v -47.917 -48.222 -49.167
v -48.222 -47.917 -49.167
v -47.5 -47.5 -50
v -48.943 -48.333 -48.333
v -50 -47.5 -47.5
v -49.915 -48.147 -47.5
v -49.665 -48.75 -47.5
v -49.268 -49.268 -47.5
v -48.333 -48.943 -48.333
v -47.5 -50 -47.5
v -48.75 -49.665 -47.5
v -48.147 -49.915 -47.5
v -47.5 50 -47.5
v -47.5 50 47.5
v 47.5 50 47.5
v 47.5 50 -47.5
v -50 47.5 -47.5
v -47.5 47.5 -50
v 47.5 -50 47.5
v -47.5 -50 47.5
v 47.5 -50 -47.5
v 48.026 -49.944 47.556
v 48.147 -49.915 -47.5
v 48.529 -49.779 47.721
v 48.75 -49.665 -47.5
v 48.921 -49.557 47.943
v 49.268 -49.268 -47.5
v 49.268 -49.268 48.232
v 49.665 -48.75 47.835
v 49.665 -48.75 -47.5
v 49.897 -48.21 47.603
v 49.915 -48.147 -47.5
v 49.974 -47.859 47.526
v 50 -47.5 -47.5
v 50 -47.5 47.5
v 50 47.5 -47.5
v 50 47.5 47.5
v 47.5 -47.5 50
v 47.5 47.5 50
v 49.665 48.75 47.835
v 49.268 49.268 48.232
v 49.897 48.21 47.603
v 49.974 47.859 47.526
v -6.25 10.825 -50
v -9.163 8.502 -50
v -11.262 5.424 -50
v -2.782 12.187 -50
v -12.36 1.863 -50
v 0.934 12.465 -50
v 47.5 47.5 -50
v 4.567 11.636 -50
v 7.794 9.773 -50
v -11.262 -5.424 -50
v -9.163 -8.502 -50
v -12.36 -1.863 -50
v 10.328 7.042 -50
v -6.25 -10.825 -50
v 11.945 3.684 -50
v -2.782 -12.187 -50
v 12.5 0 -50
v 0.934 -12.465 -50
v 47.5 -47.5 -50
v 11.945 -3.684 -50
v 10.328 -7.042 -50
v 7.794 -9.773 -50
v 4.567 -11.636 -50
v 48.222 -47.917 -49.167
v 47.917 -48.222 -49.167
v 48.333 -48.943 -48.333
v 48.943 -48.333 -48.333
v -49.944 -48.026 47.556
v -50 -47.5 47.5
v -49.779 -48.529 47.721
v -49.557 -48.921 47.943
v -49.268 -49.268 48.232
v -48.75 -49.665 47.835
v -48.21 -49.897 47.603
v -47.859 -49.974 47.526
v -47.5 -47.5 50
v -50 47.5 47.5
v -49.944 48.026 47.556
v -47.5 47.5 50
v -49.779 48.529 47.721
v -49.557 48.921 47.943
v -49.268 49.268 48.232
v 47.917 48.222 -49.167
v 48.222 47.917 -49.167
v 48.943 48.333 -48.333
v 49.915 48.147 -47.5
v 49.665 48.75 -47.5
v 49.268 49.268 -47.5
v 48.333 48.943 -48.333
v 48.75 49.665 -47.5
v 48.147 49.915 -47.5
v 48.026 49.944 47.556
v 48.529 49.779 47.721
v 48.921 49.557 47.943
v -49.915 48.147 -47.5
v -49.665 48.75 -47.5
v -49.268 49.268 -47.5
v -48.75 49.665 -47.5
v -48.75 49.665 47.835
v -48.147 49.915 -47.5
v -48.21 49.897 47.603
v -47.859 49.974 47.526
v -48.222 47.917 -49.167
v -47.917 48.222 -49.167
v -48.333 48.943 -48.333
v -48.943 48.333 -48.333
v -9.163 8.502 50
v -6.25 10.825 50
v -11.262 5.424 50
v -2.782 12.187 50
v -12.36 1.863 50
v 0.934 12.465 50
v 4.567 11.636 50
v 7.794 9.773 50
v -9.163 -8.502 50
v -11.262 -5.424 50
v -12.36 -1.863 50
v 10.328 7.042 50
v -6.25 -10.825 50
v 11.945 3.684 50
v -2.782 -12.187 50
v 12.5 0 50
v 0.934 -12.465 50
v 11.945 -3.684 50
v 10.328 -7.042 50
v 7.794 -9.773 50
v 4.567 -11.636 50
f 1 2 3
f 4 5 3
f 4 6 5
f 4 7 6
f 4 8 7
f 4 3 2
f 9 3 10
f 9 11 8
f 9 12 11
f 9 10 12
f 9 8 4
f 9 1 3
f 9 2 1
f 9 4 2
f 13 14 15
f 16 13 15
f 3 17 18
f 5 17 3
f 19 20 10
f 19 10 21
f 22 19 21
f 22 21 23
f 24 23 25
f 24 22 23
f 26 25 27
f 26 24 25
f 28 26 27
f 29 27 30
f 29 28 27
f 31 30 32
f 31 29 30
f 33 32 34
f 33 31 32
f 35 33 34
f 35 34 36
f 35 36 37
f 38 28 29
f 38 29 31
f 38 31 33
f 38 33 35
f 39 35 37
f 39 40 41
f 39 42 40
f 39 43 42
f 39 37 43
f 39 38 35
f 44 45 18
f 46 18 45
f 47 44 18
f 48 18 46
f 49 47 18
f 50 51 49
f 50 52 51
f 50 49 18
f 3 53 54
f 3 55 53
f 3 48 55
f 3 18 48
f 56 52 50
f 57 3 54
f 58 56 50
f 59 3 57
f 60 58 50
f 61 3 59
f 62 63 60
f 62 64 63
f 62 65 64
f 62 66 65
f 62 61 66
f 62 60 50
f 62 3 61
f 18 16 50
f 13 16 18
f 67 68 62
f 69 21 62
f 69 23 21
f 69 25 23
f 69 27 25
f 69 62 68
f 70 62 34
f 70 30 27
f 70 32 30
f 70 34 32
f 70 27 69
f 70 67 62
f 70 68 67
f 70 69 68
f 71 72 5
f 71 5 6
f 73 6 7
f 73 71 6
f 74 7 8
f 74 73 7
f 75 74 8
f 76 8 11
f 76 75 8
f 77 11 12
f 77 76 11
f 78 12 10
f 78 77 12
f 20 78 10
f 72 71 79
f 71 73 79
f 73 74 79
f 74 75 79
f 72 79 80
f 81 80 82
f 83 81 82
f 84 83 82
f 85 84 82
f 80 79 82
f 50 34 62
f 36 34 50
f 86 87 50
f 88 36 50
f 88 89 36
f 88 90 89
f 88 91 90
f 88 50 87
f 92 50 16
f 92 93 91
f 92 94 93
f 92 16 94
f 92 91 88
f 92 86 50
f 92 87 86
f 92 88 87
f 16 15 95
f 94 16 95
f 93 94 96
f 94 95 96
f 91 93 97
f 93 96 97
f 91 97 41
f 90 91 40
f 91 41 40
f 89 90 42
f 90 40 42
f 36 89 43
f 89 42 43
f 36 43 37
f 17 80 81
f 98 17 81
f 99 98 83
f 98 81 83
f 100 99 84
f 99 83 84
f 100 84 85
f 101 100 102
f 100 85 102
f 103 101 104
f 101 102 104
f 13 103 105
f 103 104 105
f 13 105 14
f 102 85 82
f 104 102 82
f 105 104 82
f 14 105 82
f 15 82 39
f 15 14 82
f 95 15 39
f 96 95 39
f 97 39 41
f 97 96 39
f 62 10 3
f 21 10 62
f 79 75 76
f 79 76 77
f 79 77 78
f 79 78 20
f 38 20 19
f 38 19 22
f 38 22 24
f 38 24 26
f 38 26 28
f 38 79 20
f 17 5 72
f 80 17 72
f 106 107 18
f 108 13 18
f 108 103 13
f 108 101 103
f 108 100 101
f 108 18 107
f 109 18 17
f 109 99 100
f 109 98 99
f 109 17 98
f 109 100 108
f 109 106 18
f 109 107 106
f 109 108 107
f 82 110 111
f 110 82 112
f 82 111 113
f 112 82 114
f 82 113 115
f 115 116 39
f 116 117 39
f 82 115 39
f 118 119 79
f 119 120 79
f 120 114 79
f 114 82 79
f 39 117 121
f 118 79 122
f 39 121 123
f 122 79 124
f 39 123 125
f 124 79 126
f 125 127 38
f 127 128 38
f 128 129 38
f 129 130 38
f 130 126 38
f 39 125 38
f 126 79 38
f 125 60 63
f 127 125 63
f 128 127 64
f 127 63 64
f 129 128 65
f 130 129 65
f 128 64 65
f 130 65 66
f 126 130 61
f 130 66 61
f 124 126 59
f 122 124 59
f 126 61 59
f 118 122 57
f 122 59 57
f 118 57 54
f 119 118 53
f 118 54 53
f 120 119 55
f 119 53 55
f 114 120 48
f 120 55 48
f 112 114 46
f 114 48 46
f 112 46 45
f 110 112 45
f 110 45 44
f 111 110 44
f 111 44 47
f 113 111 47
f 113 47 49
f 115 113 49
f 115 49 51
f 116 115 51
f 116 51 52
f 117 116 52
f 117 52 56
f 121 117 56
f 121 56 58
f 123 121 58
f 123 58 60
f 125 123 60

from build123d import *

# Parameters (mm, degrees)
F0_W     = 100
F0_H     = 100
F1_DEPTH = 50
F2_SIZE  = 2.5
F3_R     = 2.5
F4_SIZE  = 2.5
F5_R     = 12.5
F6_DEPTH = 100.001


with BuildPart() as f1:
    # F0 (on Front) → F1 (new body, symmetric)
    with BuildSketch(Plane.XZ):
        Rectangle(F0_W, F0_H)
    extrude(amount=F1_DEPTH, both=True)

    # F2
    f2_edges = [f1.edges().sort_by_distance(p)[0] for p in [
        (50, 0, 50),
        (0, -50, 50),
        (-50, 0, 50),
        (0, 50, 50),
    ]]
    chamfer(f2_edges, length=F2_SIZE)

    # F3
    f3_edges = [f1.edges().sort_by_distance(p)[0] for p in [
        (-50, 50, -1.25),
        (50, -50, -1.25),
        (-50, -50, -1.25),
        (50, 50, -1.25),
    ]]
    fillet(f3_edges, radius=F3_R)

    # F4
    f4_edges = [f1.edges().sort_by_distance(p)[0] for p in [
        (0, -50, -50),
        (0, 50, -50),
        (-50, 0, -50),
        (50, 0, -50),
    ]]
    chamfer(f4_edges, length=F4_SIZE)

    # F5 (on face) → F6 (cut, through all)
    with BuildSketch(Plane(origin=(0, 0, -50), x_dir=(1, 0, 0), z_dir=(0, 0, -1))):
        Circle(F5_R)
    extrude(amount=-F6_DEPTH, mode=Mode.SUBTRACT)


solid = f1.part
